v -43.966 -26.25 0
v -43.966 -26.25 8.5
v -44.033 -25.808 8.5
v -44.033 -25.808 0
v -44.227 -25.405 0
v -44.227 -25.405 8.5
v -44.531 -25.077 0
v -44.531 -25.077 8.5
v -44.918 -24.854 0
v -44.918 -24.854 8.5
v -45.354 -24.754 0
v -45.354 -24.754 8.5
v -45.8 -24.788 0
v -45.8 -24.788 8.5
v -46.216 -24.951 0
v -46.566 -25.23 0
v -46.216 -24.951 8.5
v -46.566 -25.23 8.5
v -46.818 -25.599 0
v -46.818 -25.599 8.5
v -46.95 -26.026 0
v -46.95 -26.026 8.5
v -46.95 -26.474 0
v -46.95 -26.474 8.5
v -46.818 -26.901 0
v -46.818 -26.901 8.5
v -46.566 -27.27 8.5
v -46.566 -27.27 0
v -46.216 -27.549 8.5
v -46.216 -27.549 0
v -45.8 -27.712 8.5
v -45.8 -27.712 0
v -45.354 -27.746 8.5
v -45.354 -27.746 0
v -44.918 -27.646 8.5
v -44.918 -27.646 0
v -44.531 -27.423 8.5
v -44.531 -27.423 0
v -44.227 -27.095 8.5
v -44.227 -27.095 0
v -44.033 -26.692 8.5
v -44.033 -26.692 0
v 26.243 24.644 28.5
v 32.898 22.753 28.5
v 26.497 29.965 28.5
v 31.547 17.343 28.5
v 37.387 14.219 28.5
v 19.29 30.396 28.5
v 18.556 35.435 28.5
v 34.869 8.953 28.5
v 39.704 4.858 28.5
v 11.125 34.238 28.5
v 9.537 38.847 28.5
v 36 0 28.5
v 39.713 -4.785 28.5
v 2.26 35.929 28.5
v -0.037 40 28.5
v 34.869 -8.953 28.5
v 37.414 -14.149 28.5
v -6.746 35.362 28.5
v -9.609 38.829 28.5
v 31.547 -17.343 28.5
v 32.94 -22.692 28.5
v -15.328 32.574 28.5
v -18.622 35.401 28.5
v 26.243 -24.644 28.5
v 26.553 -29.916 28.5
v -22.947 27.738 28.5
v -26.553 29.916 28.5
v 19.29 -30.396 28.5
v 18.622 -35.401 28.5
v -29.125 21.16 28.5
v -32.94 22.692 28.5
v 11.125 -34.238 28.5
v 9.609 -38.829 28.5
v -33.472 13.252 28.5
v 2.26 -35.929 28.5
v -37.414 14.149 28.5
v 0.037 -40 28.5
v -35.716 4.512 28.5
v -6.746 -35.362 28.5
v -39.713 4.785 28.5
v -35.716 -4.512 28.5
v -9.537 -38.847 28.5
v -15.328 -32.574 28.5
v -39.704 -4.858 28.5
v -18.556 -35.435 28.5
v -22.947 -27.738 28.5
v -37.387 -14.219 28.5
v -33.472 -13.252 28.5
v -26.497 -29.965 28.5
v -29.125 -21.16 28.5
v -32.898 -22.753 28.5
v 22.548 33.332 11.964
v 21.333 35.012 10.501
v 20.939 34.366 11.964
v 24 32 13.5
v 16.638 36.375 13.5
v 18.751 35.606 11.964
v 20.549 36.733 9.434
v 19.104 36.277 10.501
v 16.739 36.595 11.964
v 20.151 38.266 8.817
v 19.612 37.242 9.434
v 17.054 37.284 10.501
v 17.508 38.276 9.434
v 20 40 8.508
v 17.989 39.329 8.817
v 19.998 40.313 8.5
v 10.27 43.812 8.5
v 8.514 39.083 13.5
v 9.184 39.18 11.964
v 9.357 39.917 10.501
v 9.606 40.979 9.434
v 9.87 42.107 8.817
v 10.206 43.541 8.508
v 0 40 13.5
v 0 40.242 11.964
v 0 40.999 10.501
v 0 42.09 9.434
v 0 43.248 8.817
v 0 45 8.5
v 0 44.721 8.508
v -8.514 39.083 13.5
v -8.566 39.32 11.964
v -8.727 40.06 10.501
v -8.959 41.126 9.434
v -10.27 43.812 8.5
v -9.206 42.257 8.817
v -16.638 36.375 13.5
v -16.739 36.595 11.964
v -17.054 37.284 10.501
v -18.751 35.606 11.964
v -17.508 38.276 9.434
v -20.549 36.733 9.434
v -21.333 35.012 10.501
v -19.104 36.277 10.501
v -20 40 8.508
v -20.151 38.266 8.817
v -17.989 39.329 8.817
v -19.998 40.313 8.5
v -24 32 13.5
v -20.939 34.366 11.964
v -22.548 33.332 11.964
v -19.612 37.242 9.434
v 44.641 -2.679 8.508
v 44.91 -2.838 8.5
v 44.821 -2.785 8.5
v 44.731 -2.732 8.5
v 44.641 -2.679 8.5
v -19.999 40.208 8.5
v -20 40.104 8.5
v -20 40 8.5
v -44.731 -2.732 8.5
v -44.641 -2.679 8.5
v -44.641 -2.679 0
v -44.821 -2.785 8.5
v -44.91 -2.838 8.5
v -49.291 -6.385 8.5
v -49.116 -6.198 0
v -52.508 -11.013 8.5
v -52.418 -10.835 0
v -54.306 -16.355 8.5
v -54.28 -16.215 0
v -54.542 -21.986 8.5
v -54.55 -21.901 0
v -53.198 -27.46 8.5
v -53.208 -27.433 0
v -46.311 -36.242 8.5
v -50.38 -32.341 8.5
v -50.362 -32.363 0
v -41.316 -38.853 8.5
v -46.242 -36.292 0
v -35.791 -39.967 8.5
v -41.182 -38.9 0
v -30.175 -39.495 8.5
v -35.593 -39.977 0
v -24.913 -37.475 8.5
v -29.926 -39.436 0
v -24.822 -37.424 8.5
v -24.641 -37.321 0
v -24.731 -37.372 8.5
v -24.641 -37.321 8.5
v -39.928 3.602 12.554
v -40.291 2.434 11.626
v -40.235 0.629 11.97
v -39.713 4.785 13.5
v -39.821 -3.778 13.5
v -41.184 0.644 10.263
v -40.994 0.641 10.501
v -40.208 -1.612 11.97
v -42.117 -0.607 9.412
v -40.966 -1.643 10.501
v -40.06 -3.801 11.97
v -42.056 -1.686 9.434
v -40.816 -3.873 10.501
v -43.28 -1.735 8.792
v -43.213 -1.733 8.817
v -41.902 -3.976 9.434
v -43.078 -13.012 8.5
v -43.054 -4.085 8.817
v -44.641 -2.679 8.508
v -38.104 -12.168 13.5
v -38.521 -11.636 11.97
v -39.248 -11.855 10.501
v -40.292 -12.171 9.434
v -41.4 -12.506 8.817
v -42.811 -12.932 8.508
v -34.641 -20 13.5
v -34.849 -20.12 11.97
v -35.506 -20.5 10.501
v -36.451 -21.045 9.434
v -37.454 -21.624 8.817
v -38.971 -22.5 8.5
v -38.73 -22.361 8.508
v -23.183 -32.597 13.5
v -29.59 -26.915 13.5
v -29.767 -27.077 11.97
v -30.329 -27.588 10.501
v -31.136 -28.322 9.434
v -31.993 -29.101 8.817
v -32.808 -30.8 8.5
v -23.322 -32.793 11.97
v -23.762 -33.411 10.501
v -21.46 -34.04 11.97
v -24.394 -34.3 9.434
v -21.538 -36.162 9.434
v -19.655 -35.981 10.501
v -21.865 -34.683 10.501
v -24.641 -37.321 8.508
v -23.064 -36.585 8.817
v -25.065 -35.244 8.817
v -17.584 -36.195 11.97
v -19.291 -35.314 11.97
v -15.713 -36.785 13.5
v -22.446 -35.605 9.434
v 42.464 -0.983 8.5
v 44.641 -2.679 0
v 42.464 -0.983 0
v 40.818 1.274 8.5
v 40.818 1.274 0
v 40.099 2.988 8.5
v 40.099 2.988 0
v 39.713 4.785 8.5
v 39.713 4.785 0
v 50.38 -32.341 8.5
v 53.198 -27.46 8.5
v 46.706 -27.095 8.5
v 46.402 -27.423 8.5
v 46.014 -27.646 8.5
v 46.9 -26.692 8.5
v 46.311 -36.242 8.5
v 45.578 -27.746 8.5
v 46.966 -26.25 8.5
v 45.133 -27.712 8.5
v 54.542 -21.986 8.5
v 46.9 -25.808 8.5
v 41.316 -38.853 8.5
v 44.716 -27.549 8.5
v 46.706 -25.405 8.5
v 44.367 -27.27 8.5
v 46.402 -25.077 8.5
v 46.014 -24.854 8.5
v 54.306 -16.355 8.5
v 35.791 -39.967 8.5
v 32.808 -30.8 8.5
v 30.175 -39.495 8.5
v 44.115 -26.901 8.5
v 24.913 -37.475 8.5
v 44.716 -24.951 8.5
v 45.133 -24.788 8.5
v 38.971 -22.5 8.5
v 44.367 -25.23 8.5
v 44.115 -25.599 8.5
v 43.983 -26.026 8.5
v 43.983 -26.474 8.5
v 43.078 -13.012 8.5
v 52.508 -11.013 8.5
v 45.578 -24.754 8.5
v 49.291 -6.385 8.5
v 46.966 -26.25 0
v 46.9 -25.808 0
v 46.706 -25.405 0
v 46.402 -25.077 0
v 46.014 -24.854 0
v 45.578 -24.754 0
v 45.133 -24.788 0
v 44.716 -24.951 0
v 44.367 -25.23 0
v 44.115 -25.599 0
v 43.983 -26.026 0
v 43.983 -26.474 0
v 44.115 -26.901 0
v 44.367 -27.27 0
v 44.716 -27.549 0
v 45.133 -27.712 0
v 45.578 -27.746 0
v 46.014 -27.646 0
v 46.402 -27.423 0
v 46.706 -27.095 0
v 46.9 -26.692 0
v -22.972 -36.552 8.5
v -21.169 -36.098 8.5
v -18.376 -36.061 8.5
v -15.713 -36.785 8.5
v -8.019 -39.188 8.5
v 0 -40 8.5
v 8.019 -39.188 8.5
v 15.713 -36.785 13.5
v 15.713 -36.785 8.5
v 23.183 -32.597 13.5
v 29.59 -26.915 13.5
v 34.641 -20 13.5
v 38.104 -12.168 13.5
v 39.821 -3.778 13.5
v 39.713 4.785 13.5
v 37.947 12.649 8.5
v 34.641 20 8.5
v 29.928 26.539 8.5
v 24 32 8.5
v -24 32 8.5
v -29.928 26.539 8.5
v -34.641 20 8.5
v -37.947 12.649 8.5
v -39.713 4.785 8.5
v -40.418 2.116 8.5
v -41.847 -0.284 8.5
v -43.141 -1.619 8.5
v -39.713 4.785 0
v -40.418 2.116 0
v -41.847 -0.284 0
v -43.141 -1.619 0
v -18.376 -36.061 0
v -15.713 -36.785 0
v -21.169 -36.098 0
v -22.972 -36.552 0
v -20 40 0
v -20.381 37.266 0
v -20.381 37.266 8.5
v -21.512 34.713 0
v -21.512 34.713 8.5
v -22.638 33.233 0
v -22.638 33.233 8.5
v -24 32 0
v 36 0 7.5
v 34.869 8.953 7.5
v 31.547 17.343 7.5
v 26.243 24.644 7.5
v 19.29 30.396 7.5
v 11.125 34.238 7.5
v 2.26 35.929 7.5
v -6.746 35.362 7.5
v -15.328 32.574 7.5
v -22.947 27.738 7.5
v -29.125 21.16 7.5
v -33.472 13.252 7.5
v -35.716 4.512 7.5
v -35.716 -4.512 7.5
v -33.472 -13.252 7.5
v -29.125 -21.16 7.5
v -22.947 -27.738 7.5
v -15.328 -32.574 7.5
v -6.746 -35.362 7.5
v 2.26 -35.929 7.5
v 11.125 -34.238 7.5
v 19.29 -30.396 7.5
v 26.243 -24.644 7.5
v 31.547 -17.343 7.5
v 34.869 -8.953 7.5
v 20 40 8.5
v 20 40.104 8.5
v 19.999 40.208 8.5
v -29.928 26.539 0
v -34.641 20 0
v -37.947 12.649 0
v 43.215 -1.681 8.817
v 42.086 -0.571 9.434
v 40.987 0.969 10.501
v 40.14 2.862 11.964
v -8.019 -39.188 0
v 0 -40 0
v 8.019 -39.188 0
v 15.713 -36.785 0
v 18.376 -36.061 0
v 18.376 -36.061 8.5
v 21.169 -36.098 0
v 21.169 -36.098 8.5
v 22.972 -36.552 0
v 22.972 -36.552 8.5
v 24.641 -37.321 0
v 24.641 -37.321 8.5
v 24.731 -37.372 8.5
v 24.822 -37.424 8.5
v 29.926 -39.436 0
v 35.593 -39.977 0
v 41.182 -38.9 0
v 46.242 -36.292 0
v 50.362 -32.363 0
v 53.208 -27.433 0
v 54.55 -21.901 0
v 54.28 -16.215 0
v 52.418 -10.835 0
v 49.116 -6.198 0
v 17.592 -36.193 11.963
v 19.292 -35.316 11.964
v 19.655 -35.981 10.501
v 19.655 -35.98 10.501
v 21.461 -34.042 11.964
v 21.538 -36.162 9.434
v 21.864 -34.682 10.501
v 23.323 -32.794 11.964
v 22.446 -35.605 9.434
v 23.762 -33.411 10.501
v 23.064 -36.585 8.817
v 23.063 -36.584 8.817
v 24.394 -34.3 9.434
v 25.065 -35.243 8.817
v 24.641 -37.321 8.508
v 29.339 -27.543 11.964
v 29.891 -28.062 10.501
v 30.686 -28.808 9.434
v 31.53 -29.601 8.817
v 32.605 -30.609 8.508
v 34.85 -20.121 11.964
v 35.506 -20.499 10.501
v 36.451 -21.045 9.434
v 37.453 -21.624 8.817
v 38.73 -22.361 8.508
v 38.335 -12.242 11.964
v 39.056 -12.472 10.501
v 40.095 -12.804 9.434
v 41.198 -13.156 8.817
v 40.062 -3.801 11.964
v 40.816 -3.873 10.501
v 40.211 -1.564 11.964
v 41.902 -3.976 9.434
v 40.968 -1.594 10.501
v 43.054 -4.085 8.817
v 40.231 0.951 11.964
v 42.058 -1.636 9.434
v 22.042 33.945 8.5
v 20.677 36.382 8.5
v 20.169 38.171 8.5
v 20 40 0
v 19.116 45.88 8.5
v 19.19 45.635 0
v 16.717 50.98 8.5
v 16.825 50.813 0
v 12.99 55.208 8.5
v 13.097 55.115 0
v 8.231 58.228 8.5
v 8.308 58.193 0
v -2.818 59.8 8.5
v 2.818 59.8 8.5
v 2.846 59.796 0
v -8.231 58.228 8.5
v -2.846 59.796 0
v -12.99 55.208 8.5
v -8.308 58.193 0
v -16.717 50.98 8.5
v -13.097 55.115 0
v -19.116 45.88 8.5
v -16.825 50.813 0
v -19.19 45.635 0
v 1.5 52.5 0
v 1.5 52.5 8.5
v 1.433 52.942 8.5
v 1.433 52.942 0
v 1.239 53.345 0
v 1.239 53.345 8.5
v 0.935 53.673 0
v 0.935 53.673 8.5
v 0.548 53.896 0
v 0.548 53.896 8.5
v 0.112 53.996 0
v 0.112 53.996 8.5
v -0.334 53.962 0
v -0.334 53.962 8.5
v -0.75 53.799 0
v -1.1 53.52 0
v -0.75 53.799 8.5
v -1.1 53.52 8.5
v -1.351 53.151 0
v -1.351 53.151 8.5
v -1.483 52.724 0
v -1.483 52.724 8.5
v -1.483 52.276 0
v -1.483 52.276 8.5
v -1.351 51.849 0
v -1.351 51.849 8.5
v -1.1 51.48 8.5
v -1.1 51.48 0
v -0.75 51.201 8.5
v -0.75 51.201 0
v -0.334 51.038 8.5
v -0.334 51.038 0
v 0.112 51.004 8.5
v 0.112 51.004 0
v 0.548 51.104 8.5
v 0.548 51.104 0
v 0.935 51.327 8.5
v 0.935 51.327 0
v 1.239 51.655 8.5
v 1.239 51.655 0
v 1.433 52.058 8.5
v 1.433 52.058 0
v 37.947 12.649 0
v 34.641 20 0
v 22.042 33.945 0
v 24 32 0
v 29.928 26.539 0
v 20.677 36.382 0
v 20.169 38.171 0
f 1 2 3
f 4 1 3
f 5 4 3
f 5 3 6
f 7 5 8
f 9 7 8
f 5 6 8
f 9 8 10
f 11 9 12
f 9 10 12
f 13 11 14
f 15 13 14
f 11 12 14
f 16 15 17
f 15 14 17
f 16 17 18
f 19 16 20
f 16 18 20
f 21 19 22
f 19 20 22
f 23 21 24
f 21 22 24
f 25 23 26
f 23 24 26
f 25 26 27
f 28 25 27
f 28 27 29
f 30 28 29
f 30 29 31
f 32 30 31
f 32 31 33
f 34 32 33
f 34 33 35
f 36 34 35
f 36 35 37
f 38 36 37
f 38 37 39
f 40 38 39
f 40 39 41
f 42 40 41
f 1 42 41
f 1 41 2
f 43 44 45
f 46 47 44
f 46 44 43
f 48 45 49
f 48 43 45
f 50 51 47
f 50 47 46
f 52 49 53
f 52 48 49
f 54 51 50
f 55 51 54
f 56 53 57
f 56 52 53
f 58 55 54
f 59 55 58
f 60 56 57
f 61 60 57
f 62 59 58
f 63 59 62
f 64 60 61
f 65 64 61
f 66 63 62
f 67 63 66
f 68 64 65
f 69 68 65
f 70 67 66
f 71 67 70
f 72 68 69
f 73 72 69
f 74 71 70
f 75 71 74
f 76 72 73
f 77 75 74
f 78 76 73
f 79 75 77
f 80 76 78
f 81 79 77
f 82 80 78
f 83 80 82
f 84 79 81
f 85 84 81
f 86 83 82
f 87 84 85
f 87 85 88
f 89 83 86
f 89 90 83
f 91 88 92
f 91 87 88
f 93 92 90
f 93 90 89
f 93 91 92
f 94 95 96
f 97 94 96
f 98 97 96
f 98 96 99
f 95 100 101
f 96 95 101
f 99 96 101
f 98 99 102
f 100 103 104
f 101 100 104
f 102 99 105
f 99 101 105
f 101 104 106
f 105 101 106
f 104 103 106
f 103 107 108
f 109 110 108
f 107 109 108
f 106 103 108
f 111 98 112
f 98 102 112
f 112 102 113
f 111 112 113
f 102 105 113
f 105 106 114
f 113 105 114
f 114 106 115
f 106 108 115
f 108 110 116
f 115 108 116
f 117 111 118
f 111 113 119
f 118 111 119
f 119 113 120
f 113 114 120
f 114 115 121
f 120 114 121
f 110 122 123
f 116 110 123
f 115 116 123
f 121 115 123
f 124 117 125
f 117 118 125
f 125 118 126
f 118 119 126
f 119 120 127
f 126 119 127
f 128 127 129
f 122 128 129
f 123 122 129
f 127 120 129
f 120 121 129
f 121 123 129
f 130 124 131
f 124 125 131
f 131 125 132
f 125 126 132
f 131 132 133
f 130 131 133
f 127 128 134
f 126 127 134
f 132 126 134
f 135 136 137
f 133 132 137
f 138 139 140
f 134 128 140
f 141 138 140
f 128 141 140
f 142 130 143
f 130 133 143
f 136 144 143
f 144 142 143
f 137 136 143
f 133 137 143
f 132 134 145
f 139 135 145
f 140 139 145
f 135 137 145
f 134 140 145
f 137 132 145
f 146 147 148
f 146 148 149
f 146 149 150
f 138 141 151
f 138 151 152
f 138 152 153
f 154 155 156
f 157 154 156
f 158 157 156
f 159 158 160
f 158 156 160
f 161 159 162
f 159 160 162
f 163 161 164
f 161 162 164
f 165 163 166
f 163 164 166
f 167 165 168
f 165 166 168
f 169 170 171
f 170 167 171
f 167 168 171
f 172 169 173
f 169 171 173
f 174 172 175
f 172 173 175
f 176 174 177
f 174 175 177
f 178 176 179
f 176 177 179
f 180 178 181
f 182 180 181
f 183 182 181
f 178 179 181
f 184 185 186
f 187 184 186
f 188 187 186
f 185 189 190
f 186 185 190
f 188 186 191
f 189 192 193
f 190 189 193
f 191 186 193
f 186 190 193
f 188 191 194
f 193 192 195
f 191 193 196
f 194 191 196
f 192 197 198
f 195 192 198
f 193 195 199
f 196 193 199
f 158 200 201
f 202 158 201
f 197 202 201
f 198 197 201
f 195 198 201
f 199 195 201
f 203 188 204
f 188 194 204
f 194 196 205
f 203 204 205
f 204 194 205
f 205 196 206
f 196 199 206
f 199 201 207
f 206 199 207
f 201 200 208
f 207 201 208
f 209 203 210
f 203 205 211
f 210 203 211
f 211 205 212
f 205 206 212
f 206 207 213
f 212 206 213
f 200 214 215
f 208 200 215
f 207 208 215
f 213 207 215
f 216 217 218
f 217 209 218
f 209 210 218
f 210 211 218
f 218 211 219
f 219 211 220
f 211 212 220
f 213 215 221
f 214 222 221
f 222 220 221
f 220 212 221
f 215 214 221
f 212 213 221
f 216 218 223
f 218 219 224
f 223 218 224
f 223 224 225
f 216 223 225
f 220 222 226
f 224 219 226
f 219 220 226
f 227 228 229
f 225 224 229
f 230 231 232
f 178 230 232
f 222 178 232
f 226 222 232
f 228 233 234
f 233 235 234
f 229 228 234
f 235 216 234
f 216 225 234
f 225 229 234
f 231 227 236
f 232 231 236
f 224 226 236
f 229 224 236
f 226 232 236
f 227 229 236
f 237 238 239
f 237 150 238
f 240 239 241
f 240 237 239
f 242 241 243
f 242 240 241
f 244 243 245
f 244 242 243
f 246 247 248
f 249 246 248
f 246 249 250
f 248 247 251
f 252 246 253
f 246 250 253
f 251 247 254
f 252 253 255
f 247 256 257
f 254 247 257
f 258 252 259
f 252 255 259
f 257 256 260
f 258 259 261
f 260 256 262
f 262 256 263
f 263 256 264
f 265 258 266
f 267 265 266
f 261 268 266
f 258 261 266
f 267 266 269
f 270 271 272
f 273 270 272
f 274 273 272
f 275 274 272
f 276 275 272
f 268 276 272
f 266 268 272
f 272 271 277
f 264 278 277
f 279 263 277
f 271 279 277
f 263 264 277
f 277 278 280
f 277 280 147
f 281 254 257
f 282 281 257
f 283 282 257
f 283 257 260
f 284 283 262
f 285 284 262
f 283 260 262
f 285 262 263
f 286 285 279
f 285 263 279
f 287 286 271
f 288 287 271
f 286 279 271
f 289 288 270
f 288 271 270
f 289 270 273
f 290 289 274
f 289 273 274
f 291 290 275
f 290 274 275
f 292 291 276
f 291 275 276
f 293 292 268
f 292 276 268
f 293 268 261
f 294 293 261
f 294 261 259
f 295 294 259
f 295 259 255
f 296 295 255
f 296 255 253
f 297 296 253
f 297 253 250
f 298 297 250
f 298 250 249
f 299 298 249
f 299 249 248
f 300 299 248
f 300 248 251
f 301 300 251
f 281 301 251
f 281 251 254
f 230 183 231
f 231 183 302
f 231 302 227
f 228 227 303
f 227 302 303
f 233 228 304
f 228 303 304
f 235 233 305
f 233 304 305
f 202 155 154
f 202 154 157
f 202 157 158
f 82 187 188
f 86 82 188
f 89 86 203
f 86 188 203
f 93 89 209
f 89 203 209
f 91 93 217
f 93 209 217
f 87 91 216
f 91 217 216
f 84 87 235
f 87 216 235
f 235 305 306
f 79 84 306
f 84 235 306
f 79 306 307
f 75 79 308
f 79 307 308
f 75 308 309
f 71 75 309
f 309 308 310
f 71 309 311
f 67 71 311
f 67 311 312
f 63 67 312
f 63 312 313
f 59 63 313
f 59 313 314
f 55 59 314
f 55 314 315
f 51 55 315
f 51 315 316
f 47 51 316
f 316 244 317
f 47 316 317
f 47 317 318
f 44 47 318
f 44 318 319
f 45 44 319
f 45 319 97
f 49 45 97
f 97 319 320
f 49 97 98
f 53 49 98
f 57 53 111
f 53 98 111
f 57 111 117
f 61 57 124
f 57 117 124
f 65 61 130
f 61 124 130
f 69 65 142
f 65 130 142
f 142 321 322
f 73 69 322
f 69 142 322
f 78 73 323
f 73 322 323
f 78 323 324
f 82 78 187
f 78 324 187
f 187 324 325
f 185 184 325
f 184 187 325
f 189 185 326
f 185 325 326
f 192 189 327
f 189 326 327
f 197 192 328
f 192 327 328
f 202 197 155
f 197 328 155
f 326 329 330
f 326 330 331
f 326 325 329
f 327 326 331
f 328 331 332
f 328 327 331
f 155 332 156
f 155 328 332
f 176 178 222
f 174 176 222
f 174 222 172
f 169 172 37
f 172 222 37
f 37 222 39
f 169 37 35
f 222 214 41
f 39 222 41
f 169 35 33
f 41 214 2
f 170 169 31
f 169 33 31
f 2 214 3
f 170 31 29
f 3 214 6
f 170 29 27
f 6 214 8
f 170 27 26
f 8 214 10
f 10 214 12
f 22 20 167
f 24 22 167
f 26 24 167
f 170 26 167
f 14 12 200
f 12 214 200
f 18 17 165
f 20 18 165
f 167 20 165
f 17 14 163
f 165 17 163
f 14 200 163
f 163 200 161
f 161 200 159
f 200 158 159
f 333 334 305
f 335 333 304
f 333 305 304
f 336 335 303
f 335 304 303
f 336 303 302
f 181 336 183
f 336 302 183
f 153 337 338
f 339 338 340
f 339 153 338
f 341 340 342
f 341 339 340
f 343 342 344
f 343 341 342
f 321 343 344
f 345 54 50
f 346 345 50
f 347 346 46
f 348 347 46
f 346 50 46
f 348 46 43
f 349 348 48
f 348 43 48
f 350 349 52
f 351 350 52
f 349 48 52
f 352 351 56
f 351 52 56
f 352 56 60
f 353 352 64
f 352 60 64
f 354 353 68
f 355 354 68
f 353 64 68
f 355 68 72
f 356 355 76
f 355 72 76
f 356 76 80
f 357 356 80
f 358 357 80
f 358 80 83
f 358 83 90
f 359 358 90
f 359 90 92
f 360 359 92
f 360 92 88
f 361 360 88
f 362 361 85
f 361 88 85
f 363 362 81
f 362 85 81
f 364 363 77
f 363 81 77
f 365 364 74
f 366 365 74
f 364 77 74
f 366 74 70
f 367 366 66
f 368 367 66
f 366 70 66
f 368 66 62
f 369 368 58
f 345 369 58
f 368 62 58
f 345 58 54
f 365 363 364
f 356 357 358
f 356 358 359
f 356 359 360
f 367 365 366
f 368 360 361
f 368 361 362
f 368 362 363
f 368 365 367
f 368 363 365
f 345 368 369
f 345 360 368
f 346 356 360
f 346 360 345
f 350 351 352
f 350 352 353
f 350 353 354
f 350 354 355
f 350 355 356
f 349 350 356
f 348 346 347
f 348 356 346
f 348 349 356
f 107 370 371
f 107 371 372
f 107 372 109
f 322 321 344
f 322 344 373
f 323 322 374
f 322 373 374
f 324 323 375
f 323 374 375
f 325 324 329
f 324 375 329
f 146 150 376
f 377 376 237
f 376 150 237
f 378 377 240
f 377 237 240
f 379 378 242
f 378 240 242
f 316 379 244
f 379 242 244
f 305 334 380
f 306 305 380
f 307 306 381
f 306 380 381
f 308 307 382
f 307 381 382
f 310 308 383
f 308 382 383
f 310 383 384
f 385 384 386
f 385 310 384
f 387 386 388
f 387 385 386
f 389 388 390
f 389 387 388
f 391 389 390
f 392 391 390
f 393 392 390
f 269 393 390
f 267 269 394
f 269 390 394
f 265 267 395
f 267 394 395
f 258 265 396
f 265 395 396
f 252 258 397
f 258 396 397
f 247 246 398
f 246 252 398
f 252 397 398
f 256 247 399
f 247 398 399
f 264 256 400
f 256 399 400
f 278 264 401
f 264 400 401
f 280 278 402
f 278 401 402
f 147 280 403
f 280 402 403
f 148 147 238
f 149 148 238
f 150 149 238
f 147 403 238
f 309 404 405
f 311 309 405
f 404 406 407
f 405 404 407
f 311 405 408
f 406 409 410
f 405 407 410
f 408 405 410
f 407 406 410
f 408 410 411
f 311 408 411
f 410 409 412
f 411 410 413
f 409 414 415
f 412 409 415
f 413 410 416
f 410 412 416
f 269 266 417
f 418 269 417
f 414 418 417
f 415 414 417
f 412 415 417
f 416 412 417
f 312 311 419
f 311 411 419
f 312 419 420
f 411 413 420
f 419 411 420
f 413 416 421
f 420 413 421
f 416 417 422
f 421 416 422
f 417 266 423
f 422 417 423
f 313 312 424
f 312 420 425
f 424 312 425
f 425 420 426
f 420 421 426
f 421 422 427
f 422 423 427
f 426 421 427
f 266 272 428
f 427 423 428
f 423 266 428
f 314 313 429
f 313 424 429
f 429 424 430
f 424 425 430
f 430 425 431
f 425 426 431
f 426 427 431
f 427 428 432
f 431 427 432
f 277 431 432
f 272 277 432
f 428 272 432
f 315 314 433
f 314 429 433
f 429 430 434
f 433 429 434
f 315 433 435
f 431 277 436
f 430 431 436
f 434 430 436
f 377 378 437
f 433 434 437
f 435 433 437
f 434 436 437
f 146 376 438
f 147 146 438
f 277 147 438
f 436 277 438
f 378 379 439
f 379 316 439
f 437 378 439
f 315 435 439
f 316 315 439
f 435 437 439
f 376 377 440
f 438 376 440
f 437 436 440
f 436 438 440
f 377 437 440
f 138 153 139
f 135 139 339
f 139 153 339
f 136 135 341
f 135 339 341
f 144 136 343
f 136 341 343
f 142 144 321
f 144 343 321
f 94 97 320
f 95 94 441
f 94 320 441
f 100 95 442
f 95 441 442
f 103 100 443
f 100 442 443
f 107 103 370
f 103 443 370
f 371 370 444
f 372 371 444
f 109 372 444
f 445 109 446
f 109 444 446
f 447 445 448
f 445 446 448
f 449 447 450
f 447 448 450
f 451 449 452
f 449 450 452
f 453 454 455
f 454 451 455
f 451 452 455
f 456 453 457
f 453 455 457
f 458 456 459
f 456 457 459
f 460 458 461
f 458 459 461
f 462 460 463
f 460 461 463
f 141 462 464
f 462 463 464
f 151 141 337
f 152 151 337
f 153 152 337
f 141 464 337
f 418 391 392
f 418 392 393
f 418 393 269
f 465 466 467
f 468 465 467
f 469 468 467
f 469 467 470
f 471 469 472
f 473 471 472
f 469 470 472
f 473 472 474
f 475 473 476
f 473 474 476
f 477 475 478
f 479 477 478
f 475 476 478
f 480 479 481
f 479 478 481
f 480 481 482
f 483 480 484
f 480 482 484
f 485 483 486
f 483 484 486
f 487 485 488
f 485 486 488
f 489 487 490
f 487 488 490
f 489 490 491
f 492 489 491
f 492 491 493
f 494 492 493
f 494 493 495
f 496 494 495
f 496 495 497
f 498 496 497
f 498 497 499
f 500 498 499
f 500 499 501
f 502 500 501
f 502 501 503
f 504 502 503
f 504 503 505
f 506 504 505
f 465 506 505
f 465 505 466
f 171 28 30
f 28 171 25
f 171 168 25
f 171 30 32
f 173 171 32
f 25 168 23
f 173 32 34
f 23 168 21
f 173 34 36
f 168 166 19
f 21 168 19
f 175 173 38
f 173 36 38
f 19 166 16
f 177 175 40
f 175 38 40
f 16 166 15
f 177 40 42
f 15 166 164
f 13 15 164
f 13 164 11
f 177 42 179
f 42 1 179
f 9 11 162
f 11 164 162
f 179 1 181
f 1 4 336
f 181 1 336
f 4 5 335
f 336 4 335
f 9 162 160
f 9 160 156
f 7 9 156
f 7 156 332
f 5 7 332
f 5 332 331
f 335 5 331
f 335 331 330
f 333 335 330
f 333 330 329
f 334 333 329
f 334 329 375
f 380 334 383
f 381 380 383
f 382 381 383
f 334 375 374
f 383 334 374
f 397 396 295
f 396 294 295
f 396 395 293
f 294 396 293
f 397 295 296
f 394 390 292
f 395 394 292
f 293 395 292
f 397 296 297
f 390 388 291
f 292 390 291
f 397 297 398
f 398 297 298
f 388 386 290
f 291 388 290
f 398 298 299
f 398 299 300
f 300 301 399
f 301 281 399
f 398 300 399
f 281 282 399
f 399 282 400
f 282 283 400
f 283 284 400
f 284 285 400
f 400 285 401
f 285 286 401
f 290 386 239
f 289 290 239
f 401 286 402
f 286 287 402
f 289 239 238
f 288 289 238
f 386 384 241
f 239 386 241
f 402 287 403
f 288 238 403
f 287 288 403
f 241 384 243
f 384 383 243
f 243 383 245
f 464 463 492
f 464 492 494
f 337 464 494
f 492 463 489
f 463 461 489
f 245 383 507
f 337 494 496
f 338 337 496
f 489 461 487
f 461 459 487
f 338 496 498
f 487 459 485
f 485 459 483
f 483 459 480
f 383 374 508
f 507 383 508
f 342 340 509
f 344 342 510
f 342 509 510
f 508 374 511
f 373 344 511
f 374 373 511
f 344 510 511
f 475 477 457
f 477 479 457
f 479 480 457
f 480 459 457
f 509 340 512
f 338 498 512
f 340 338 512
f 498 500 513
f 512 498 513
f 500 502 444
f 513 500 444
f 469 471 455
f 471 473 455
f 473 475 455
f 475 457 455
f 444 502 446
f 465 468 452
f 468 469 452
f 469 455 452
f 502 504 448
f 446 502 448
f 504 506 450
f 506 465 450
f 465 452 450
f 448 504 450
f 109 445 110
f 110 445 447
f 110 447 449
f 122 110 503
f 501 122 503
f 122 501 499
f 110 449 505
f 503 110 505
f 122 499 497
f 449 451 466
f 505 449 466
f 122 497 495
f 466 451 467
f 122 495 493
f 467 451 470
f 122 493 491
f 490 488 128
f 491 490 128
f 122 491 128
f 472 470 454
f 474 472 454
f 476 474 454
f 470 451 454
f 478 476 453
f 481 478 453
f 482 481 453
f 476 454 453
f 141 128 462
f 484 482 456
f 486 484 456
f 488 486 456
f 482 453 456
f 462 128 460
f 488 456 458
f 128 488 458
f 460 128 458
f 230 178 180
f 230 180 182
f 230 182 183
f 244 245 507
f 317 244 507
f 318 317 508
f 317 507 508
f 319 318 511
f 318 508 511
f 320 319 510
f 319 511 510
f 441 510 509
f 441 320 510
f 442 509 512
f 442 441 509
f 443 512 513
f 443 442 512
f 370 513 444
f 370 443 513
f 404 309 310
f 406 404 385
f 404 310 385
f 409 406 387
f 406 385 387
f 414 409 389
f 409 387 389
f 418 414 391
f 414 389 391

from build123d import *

# Parameters (mm, degrees)
ESTRUSIONE_ESTRUSIONE1_DEPTH = 8.5
RACCORDO1_R                  = 10
SCHIZZO2_R                   = 40
ESTRUSIONE_ESTRUSIONE2_DEPTH = 20
RACCORDO2_START              = 8.5
RACCORDO2_DEPTH              = 5.0000001
SCHIZZO3_R                   = 1.5
TAGLIO_ESTRUSIONE1_DEPTH     = 20
SCHIZZO4_R                   = 36
TAGLIO_ESTRUSIONE2_DEPTH     = 21


with BuildPart() as part:
    # Schizzo1 → Estrusione-Estrusione1 (new body)
    with BuildSketch(Plane.XY):
        with BuildLine():
            ThreePointArc((-20.628430767, -34.270509831), (0, -40), (20.628430767, -34.270509831))
            ThreePointArc((20.628430767, -34.270509831), (51.961524227, -30), (39.993347498, -0.729490169))
            ThreePointArc((39.993347498, -0.729490169), (34.641016151, 20), (19.364916731, 35))
            ThreePointArc((19.364916731, 35), (0, 60), (-19.364916731, 35))
            ThreePointArc((-19.364916731, 35), (-34.641016151, 20), (-39.993347498, -0.729490169))
            ThreePointArc((-39.993347498, -0.729490169), (-51.961524227, -30), (-20.628430767, -34.270509831))
        make_face()
    extrude(amount=ESTRUSIONE_ESTRUSIONE1_DEPTH)

    # Raccordo1
    raccordo1_edges = [part.edges().sort_by_distance(p)[0] for p in [
        (39.993347498, -0.729490169, 4.25),
        (20.628430767, -34.270509831, 4.25),
        (-20.628430767, -34.270509831, 4.25),
        (-39.993347498, -0.729490169, 4.25),
        (-19.364916731, 35, 4.25),
        (19.364916731, 35, 4.25),
    ]]
    fillet(raccordo1_edges, radius=RACCORDO1_R)

    # Schizzo2 → Estrusione-Estrusione2 (add)
    with BuildSketch(Plane.XY.offset(8.5)):
        with Locations(Location((0, 0, 0), (0, 0, 173.130102354))):
            Circle(SCHIZZO2_R)
    extrude(amount=ESTRUSIONE_ESTRUSIONE2_DEPTH)

    # Raccordo2: read off the stored shape, not the designer's step
    # Raccordo2 outline → Raccordo2 (add)
    with BuildSketch(Plane.XY.offset(RACCORDO2_START)):
        with BuildLine():
            ThreePointArc((-20, 40), (-21.05572809, 35.527864045), (-24, 32))
            ThreePointArc((-24, 32), (0, 40), (24, 32))
            ThreePointArc((24, 32), (21.05572809, 35.527864045), (20, 40))
            ThreePointArc((20, 40), (0, 60), (-20, 40))
        make_face()
        with BuildLine():
            ThreePointArc((-15.712812921, -36.784609691), (-34.641016151, -20), (-39.712812921, 4.784609691))
            ThreePointArc((-39.712812921, 4.784609691), (-41.29589685, 0.470863399), (-44.641016151, -2.679491924))
            ThreePointArc((-44.641016151, -2.679491924), (-51.961524227, -30), (-24.641016151, -37.320508076))
            ThreePointArc((-24.641016151, -37.320508076), (-20.24016876, -35.998727444), (-15.712812921, -36.784609691))
        make_face()
        with BuildLine():
            ThreePointArc((44.641016151, -2.679491924), (41.29589685, 0.470863399), (39.712812921, 4.784609691))
            ThreePointArc((39.712812921, 4.784609691), (34.641016151, -20), (15.712812921, -36.784609691))
            ThreePointArc((15.712812921, -36.784609691), (20.24016876, -35.998727444), (24.641016151, -37.320508076))
            ThreePointArc((24.641016151, -37.320508076), (51.961524227, -30), (44.641016151, -2.679491924))
        make_face()
    extrude(amount=RACCORDO2_DEPTH)

    # Raccordo2 2 outline → Raccordo2 2 (revolve, cut)
    with BuildSketch(Plane.XZ):
        with BuildLine():
            ThreePointArc((40, 13.5), (41.464466094, 9.964466094), (45, 8.5))
            Line((45, 8.5), (60, 8.5))
            Line((60, 8.5), (60, 13.5000001))
            Line((60, 13.5000001), (40, 13.5))
        make_face()
    revolve(axis=Axis((0, 0, 0), (0, 0, 1)), mode=Mode.SUBTRACT)

    # Schizzo3 → Taglio-Estrusione1 (cut)
    with BuildSketch(Plane.XY.offset(8.5)):
        with Locations((0, 52.5)):
            Circle(SCHIZZO3_R)
        with Locations((-45.466333699, -26.25)):
            Circle(SCHIZZO3_R)
        with Locations((45.466333699, -26.25)):
            Circle(SCHIZZO3_R)
    extrude(amount=-TAGLIO_ESTRUSIONE1_DEPTH, mode=Mode.SUBTRACT)

    # Schizzo4 → Taglio-Estrusione2 (cut)
    with BuildSketch(Plane.XY.offset(28.5)):
        Circle(SCHIZZO4_R)
    extrude(amount=-TAGLIO_ESTRUSIONE2_DEPTH, mode=Mode.SUBTRACT)


solid = part.part
